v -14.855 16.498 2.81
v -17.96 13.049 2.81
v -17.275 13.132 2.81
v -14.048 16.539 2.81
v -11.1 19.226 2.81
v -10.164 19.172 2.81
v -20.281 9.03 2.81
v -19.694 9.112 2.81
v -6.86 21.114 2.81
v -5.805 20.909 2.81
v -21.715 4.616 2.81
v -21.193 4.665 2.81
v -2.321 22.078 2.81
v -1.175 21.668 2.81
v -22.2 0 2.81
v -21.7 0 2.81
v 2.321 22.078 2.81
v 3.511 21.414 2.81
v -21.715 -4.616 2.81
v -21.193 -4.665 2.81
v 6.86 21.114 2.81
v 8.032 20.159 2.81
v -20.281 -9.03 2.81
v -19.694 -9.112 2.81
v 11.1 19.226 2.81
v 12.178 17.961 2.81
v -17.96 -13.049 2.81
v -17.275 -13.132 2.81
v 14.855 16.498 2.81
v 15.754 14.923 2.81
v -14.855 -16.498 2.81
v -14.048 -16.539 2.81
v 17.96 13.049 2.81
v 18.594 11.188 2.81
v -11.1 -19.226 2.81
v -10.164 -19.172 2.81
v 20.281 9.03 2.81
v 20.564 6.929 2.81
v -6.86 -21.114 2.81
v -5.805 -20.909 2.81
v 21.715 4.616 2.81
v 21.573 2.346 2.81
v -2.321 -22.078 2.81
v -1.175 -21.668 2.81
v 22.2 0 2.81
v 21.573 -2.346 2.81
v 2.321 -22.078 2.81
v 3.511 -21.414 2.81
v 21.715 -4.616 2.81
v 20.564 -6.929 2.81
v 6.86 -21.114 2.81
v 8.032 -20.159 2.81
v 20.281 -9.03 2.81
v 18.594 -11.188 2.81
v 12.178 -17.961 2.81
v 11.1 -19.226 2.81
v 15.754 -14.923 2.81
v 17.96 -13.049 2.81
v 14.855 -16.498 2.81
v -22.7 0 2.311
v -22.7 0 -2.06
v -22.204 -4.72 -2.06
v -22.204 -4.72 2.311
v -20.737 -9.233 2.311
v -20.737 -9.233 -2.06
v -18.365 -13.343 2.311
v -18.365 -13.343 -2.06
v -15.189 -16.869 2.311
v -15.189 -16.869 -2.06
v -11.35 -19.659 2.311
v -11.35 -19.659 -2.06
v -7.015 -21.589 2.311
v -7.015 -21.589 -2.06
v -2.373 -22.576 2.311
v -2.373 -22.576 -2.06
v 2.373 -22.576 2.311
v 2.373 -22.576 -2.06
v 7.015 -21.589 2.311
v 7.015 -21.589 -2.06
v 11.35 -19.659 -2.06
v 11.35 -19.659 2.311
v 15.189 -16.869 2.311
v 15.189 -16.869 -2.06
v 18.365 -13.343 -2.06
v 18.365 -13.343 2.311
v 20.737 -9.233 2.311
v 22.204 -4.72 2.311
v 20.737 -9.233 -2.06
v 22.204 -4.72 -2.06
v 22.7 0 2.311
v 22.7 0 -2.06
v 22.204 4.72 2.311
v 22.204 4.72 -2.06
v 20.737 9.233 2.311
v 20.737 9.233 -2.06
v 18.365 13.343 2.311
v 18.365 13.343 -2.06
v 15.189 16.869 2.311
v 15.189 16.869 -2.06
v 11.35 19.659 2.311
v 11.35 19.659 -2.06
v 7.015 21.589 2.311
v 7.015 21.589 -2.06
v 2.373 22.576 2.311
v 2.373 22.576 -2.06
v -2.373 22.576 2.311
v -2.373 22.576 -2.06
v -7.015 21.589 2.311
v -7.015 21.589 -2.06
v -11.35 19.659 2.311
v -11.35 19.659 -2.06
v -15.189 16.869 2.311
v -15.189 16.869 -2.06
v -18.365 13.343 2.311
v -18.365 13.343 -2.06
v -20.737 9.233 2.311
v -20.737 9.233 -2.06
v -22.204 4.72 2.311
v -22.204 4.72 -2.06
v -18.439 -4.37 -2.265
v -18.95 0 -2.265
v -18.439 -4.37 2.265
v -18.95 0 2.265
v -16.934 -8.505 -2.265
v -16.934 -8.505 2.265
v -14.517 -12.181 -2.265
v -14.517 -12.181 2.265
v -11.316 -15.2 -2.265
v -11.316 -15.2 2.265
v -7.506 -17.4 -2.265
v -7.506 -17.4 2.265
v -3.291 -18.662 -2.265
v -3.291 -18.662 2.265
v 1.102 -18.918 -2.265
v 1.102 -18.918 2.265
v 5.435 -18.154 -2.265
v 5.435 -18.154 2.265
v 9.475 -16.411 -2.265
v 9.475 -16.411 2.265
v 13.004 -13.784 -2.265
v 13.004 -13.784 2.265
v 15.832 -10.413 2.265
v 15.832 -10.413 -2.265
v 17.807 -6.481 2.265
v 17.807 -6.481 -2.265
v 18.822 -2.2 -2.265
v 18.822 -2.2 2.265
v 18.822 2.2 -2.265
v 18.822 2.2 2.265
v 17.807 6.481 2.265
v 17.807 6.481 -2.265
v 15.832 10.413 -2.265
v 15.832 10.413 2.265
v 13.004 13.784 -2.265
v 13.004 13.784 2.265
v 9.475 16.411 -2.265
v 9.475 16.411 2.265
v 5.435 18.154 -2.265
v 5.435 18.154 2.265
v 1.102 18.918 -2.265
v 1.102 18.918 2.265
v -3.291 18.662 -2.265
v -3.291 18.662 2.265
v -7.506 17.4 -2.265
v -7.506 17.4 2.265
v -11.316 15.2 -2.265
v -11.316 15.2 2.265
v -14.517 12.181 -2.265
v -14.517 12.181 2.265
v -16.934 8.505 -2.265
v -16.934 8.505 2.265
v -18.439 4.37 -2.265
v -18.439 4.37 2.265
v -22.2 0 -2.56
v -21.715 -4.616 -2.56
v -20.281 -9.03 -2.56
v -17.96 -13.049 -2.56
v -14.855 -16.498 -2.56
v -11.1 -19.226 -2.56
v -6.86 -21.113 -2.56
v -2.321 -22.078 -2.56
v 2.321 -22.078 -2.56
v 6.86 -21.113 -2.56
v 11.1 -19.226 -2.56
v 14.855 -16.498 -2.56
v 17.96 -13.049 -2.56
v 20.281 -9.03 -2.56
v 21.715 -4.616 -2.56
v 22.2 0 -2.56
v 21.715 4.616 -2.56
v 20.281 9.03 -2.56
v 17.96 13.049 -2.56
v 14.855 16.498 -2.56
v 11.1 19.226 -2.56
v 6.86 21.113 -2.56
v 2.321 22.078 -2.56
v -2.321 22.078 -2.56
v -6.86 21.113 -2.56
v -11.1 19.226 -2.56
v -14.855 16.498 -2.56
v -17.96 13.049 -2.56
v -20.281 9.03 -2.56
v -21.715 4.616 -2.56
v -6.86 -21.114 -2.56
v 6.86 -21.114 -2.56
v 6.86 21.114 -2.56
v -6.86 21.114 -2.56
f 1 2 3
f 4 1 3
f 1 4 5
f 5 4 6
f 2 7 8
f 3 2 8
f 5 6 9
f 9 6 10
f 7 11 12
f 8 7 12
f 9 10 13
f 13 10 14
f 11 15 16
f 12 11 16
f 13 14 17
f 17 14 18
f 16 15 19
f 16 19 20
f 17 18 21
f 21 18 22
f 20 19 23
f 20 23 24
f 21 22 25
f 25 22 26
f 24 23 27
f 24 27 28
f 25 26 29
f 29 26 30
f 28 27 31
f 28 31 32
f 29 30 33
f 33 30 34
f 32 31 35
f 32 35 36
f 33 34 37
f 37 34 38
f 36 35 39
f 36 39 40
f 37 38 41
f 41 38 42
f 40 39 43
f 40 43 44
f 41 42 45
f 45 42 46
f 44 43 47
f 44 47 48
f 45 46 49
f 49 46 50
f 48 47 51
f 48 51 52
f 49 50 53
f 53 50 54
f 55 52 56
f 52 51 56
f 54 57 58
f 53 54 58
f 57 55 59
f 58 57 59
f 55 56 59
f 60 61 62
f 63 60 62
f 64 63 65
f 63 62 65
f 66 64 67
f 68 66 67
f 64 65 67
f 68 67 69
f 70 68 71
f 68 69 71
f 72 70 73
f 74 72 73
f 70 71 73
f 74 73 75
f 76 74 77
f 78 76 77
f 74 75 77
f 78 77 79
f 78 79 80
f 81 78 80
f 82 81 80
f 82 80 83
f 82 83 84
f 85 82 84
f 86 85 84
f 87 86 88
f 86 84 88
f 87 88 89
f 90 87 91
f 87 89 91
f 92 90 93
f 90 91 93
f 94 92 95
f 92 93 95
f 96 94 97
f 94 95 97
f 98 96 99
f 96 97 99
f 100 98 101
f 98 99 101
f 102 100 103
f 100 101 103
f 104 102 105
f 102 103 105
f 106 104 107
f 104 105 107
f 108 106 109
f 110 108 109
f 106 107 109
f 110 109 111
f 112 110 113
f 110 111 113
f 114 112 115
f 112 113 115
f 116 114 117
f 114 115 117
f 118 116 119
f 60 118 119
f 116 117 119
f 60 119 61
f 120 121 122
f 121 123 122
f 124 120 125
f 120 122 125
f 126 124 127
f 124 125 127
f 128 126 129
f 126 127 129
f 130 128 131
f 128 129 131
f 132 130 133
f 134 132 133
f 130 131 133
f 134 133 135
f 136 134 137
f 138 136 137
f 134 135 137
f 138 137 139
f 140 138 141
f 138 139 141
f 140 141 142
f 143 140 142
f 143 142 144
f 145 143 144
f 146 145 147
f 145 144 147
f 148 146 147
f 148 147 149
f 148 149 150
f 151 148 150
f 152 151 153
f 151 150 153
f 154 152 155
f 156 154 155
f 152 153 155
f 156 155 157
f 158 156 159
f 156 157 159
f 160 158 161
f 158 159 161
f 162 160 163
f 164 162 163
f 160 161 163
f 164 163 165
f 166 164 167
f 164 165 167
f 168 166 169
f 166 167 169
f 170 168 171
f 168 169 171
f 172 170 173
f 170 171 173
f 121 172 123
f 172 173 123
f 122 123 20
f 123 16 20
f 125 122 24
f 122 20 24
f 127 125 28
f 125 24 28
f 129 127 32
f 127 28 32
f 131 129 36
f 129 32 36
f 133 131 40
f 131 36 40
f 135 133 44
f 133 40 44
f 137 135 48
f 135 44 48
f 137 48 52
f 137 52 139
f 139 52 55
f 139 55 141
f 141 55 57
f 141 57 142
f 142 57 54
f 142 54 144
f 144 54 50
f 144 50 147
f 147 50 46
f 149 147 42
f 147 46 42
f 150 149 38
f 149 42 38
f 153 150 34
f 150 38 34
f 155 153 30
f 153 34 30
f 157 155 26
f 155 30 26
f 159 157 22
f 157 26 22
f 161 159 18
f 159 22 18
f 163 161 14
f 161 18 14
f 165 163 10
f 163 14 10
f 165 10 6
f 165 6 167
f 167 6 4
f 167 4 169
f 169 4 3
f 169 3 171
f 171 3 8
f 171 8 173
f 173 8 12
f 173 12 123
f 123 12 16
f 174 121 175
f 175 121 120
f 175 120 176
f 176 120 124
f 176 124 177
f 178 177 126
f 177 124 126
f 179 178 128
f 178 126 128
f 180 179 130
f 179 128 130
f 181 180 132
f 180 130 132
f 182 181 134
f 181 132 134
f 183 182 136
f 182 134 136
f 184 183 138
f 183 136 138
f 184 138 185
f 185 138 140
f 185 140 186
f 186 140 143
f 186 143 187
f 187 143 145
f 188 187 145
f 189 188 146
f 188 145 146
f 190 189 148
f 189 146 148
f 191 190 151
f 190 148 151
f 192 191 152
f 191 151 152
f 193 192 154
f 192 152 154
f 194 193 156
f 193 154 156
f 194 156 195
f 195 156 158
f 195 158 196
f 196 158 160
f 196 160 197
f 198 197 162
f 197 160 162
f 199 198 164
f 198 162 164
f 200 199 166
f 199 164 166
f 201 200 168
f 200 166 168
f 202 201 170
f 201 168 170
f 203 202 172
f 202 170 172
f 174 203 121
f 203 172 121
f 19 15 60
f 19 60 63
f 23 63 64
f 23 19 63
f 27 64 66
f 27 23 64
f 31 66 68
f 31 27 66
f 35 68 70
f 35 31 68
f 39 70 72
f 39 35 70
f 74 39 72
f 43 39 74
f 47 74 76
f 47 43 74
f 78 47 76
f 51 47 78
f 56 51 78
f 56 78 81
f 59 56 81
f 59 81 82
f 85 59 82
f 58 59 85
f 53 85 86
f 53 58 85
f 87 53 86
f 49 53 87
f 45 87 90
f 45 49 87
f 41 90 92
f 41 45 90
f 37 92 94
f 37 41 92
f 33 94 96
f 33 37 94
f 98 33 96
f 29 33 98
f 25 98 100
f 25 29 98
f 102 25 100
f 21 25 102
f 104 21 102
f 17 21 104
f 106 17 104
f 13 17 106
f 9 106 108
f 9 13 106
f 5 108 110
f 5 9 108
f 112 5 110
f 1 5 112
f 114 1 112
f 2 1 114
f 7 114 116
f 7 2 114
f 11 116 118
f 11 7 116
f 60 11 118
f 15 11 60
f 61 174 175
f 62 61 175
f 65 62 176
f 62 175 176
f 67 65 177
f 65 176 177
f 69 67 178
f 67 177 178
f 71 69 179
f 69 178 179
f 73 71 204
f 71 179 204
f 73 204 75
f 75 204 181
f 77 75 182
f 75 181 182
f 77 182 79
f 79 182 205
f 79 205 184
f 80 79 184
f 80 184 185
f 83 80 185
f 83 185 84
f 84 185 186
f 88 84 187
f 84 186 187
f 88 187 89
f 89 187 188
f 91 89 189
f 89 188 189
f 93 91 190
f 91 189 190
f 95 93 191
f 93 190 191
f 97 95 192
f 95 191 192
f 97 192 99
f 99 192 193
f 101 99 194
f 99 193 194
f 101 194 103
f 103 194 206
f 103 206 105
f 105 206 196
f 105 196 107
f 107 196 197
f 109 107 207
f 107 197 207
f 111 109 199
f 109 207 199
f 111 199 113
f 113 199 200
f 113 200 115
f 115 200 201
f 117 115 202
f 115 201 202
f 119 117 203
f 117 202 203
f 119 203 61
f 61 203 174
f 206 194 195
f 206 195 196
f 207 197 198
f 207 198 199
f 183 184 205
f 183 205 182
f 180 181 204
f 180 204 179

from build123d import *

# Parameters (mm, degrees)
CHAMFER1_SIZE = 0.5


with BuildPart() as part:
    # Sketch2 → Revolve1 (revolve)
    with BuildSketch(Plane(origin=(0, 0, 0), x_dir=(0, 0, -1), z_dir=(1, 0, 0)), mode=Mode.PRIVATE) as revolve1_sk:
        Polygon((-2.810478001, 22.7), (2.559521999, 22.7), (2.559521999, 22.2), (2.265464537, 18.95), (-2.265464537, 18.95), (-2.810478001, 21.7), align=None)
    revolve(revolve1_sk.sketch.rotate(Axis((0, 0, -1.408758661), (0, 0, 1)), 90), axis=Axis((0, 0, -1.408758661), (0, 0, 1)))

    # Chamfer1
    chamfer1_edges = [part.edges().sort_by_distance(p)[0] for p in [
        (22.7, 0, 2.810478001),
        (22.7, 0, -2.559521999),
    ]]
    chamfer(chamfer1_edges, length=CHAMFER1_SIZE - 0.0001)  # a hair under: the kernel refuses the full size


solid = part.part
